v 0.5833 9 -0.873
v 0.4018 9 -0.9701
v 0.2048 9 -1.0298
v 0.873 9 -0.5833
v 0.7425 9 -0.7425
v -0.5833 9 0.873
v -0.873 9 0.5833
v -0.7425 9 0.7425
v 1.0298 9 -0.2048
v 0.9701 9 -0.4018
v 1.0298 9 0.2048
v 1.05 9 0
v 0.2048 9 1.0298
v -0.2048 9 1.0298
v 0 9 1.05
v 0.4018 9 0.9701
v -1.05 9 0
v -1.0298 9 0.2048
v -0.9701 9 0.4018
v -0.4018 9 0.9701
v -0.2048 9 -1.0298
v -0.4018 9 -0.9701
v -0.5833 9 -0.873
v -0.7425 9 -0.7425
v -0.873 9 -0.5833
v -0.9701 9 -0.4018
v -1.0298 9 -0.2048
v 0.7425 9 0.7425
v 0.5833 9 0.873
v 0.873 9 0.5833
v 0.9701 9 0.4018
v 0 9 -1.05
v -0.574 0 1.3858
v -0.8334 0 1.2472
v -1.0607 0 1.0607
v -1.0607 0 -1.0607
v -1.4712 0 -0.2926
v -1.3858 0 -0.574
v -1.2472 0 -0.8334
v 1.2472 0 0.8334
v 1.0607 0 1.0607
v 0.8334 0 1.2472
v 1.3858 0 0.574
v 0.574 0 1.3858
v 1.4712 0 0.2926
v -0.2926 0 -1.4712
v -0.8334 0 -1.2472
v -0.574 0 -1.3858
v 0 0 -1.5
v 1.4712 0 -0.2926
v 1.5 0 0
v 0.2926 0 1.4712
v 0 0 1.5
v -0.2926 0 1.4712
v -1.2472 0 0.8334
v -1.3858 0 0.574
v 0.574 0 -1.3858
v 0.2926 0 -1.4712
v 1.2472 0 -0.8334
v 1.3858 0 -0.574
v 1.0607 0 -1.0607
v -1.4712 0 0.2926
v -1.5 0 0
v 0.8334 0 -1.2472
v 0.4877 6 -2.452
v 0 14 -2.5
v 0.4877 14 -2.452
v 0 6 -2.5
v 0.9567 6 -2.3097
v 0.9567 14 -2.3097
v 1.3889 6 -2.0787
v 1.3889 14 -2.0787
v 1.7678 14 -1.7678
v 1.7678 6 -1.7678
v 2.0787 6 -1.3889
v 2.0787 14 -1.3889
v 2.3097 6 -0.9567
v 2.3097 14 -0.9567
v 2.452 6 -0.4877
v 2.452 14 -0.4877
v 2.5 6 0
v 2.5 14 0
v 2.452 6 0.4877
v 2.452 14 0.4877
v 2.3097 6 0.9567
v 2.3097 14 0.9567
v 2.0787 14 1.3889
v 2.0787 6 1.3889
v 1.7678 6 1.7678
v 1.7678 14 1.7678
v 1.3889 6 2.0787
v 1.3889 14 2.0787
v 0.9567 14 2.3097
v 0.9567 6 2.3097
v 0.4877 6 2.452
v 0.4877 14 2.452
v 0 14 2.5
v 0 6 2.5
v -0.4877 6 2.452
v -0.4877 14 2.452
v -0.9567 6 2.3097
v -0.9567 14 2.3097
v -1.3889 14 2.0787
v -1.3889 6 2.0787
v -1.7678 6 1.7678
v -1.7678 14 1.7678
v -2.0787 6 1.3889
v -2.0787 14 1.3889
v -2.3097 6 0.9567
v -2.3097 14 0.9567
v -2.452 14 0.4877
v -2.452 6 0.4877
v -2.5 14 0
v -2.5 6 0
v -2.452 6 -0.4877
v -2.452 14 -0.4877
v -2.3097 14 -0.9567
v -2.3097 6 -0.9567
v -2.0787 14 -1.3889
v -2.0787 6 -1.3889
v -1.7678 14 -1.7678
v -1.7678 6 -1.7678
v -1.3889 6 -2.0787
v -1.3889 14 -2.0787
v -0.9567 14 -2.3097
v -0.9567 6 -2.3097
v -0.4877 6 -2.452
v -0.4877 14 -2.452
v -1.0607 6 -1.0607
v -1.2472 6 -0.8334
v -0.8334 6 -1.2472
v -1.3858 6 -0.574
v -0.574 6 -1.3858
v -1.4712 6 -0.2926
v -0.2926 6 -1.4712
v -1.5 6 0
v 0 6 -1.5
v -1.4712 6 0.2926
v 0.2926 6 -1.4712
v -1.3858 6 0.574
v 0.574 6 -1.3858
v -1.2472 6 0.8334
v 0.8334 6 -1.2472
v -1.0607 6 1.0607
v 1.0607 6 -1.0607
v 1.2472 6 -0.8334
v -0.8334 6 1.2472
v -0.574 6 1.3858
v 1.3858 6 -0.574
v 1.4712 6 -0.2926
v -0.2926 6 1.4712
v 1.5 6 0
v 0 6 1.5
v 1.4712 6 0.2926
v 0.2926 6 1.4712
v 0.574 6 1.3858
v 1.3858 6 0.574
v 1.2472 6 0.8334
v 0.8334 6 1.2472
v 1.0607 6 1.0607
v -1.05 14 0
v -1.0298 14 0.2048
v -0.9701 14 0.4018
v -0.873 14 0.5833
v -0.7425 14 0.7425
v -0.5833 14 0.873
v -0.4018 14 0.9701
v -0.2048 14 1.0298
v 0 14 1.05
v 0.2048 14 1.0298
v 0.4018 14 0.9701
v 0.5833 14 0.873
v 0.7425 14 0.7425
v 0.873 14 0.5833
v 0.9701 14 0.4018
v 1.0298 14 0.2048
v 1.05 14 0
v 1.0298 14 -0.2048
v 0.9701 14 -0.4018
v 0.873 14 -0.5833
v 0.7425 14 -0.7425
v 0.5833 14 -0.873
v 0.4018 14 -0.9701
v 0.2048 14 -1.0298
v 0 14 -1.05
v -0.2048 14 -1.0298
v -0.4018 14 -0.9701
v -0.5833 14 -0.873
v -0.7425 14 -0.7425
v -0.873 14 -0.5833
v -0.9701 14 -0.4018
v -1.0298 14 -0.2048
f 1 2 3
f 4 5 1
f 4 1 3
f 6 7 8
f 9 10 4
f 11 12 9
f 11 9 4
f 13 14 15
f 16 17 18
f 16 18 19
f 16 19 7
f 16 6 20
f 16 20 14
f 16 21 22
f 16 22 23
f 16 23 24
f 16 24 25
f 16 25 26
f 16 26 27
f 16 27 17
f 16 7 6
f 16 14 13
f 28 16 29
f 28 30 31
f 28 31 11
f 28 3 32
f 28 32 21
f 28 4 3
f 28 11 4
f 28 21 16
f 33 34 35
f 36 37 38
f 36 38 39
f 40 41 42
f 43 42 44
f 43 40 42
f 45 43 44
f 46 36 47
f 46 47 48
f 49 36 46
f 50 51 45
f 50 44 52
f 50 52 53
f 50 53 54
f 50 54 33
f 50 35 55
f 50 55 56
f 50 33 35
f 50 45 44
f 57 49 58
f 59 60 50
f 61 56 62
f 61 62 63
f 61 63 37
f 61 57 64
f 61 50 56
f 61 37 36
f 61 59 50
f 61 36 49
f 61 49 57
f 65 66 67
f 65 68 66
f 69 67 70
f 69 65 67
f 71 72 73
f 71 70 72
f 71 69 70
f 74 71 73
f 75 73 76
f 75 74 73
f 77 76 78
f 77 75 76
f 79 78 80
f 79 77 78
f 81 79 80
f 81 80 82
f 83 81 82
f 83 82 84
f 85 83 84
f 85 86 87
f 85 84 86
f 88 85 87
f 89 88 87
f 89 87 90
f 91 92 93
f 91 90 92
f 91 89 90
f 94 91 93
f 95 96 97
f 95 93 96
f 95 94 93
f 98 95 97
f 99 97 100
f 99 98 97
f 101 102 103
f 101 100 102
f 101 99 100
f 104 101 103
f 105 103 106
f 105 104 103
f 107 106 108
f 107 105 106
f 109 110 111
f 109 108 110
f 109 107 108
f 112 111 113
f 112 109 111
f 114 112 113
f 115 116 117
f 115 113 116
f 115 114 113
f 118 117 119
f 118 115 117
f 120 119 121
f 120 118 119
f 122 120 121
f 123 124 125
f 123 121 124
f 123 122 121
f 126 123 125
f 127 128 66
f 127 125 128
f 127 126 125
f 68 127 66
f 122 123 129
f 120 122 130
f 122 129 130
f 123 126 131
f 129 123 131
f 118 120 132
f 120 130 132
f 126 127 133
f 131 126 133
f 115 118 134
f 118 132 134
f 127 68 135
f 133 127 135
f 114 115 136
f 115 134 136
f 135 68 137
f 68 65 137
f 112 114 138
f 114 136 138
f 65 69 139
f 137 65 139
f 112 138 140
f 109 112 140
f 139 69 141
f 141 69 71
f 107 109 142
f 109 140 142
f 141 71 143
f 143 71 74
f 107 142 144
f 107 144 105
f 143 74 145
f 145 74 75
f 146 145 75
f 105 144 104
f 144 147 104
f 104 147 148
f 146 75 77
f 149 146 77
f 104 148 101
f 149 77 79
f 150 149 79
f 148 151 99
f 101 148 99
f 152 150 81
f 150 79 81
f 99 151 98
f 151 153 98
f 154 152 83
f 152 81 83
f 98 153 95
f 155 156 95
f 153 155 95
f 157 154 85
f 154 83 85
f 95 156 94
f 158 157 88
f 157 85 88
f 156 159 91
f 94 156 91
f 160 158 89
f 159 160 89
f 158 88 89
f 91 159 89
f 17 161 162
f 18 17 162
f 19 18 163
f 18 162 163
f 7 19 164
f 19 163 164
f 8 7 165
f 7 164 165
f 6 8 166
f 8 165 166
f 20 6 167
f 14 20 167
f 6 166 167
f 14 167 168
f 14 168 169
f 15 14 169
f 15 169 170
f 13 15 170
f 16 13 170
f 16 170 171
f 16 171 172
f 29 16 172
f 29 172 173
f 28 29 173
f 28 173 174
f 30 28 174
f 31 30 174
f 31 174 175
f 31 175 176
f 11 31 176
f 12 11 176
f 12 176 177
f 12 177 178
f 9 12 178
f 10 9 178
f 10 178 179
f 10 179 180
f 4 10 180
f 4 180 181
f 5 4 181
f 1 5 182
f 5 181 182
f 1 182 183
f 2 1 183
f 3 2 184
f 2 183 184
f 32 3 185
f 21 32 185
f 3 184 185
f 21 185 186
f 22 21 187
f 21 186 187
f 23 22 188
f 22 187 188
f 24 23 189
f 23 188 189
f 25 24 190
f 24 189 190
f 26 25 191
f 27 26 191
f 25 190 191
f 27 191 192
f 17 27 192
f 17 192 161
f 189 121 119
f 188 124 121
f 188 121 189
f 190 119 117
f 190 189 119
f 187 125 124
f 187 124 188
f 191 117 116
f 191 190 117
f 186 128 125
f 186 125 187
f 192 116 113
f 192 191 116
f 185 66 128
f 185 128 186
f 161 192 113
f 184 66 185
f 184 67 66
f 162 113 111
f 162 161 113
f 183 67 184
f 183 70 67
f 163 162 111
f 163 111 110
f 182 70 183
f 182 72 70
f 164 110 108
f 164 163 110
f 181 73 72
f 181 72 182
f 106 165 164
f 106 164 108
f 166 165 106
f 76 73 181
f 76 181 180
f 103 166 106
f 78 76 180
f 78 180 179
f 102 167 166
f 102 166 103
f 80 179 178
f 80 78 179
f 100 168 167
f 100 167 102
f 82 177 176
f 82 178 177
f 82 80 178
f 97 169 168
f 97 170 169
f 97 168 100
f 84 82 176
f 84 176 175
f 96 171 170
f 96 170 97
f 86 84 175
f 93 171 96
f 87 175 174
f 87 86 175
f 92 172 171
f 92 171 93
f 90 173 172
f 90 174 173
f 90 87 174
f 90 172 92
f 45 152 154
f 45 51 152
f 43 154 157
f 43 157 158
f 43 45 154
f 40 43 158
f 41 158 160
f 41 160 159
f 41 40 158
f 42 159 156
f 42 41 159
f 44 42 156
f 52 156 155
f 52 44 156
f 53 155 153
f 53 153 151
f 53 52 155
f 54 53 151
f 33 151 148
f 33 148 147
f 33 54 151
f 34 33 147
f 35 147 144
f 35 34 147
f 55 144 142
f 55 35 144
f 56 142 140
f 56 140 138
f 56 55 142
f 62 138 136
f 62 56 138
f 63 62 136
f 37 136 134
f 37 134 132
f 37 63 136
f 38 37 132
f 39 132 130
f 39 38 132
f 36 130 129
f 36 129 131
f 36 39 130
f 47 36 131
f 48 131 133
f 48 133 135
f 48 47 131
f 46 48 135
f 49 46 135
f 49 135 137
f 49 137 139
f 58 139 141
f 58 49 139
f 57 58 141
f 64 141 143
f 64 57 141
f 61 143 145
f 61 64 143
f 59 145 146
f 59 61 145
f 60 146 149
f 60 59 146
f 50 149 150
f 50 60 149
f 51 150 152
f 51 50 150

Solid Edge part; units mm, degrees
sketch "Sketch1" plane through (0, 0, 0) normal (0, -1, 0) x (1, 0, 0)
  circle A0 centre (0, 0) radius 1.5
extrude "Protrusion1" add sketch "Sketch1" against normal blind 6
sketch "Sketch2" plane through (0, 6, 0) normal (0, 1, 0) x (0, 0, -1)
  circle A0 centre (0, 0) radius 2.5
extrude "ExtrudedProtrusion_2" add sketch "Sketch2" along normal blind 8
sketch "Sketch3" plane through (0, 14, 0) normal (0, 1, 0) x (-1, 0, 0)
  circle A0 centre (0, 0) radius 1.05
extrude "ExtrudedCutout_1" cut sketch "Sketch3" against normal blind 5
